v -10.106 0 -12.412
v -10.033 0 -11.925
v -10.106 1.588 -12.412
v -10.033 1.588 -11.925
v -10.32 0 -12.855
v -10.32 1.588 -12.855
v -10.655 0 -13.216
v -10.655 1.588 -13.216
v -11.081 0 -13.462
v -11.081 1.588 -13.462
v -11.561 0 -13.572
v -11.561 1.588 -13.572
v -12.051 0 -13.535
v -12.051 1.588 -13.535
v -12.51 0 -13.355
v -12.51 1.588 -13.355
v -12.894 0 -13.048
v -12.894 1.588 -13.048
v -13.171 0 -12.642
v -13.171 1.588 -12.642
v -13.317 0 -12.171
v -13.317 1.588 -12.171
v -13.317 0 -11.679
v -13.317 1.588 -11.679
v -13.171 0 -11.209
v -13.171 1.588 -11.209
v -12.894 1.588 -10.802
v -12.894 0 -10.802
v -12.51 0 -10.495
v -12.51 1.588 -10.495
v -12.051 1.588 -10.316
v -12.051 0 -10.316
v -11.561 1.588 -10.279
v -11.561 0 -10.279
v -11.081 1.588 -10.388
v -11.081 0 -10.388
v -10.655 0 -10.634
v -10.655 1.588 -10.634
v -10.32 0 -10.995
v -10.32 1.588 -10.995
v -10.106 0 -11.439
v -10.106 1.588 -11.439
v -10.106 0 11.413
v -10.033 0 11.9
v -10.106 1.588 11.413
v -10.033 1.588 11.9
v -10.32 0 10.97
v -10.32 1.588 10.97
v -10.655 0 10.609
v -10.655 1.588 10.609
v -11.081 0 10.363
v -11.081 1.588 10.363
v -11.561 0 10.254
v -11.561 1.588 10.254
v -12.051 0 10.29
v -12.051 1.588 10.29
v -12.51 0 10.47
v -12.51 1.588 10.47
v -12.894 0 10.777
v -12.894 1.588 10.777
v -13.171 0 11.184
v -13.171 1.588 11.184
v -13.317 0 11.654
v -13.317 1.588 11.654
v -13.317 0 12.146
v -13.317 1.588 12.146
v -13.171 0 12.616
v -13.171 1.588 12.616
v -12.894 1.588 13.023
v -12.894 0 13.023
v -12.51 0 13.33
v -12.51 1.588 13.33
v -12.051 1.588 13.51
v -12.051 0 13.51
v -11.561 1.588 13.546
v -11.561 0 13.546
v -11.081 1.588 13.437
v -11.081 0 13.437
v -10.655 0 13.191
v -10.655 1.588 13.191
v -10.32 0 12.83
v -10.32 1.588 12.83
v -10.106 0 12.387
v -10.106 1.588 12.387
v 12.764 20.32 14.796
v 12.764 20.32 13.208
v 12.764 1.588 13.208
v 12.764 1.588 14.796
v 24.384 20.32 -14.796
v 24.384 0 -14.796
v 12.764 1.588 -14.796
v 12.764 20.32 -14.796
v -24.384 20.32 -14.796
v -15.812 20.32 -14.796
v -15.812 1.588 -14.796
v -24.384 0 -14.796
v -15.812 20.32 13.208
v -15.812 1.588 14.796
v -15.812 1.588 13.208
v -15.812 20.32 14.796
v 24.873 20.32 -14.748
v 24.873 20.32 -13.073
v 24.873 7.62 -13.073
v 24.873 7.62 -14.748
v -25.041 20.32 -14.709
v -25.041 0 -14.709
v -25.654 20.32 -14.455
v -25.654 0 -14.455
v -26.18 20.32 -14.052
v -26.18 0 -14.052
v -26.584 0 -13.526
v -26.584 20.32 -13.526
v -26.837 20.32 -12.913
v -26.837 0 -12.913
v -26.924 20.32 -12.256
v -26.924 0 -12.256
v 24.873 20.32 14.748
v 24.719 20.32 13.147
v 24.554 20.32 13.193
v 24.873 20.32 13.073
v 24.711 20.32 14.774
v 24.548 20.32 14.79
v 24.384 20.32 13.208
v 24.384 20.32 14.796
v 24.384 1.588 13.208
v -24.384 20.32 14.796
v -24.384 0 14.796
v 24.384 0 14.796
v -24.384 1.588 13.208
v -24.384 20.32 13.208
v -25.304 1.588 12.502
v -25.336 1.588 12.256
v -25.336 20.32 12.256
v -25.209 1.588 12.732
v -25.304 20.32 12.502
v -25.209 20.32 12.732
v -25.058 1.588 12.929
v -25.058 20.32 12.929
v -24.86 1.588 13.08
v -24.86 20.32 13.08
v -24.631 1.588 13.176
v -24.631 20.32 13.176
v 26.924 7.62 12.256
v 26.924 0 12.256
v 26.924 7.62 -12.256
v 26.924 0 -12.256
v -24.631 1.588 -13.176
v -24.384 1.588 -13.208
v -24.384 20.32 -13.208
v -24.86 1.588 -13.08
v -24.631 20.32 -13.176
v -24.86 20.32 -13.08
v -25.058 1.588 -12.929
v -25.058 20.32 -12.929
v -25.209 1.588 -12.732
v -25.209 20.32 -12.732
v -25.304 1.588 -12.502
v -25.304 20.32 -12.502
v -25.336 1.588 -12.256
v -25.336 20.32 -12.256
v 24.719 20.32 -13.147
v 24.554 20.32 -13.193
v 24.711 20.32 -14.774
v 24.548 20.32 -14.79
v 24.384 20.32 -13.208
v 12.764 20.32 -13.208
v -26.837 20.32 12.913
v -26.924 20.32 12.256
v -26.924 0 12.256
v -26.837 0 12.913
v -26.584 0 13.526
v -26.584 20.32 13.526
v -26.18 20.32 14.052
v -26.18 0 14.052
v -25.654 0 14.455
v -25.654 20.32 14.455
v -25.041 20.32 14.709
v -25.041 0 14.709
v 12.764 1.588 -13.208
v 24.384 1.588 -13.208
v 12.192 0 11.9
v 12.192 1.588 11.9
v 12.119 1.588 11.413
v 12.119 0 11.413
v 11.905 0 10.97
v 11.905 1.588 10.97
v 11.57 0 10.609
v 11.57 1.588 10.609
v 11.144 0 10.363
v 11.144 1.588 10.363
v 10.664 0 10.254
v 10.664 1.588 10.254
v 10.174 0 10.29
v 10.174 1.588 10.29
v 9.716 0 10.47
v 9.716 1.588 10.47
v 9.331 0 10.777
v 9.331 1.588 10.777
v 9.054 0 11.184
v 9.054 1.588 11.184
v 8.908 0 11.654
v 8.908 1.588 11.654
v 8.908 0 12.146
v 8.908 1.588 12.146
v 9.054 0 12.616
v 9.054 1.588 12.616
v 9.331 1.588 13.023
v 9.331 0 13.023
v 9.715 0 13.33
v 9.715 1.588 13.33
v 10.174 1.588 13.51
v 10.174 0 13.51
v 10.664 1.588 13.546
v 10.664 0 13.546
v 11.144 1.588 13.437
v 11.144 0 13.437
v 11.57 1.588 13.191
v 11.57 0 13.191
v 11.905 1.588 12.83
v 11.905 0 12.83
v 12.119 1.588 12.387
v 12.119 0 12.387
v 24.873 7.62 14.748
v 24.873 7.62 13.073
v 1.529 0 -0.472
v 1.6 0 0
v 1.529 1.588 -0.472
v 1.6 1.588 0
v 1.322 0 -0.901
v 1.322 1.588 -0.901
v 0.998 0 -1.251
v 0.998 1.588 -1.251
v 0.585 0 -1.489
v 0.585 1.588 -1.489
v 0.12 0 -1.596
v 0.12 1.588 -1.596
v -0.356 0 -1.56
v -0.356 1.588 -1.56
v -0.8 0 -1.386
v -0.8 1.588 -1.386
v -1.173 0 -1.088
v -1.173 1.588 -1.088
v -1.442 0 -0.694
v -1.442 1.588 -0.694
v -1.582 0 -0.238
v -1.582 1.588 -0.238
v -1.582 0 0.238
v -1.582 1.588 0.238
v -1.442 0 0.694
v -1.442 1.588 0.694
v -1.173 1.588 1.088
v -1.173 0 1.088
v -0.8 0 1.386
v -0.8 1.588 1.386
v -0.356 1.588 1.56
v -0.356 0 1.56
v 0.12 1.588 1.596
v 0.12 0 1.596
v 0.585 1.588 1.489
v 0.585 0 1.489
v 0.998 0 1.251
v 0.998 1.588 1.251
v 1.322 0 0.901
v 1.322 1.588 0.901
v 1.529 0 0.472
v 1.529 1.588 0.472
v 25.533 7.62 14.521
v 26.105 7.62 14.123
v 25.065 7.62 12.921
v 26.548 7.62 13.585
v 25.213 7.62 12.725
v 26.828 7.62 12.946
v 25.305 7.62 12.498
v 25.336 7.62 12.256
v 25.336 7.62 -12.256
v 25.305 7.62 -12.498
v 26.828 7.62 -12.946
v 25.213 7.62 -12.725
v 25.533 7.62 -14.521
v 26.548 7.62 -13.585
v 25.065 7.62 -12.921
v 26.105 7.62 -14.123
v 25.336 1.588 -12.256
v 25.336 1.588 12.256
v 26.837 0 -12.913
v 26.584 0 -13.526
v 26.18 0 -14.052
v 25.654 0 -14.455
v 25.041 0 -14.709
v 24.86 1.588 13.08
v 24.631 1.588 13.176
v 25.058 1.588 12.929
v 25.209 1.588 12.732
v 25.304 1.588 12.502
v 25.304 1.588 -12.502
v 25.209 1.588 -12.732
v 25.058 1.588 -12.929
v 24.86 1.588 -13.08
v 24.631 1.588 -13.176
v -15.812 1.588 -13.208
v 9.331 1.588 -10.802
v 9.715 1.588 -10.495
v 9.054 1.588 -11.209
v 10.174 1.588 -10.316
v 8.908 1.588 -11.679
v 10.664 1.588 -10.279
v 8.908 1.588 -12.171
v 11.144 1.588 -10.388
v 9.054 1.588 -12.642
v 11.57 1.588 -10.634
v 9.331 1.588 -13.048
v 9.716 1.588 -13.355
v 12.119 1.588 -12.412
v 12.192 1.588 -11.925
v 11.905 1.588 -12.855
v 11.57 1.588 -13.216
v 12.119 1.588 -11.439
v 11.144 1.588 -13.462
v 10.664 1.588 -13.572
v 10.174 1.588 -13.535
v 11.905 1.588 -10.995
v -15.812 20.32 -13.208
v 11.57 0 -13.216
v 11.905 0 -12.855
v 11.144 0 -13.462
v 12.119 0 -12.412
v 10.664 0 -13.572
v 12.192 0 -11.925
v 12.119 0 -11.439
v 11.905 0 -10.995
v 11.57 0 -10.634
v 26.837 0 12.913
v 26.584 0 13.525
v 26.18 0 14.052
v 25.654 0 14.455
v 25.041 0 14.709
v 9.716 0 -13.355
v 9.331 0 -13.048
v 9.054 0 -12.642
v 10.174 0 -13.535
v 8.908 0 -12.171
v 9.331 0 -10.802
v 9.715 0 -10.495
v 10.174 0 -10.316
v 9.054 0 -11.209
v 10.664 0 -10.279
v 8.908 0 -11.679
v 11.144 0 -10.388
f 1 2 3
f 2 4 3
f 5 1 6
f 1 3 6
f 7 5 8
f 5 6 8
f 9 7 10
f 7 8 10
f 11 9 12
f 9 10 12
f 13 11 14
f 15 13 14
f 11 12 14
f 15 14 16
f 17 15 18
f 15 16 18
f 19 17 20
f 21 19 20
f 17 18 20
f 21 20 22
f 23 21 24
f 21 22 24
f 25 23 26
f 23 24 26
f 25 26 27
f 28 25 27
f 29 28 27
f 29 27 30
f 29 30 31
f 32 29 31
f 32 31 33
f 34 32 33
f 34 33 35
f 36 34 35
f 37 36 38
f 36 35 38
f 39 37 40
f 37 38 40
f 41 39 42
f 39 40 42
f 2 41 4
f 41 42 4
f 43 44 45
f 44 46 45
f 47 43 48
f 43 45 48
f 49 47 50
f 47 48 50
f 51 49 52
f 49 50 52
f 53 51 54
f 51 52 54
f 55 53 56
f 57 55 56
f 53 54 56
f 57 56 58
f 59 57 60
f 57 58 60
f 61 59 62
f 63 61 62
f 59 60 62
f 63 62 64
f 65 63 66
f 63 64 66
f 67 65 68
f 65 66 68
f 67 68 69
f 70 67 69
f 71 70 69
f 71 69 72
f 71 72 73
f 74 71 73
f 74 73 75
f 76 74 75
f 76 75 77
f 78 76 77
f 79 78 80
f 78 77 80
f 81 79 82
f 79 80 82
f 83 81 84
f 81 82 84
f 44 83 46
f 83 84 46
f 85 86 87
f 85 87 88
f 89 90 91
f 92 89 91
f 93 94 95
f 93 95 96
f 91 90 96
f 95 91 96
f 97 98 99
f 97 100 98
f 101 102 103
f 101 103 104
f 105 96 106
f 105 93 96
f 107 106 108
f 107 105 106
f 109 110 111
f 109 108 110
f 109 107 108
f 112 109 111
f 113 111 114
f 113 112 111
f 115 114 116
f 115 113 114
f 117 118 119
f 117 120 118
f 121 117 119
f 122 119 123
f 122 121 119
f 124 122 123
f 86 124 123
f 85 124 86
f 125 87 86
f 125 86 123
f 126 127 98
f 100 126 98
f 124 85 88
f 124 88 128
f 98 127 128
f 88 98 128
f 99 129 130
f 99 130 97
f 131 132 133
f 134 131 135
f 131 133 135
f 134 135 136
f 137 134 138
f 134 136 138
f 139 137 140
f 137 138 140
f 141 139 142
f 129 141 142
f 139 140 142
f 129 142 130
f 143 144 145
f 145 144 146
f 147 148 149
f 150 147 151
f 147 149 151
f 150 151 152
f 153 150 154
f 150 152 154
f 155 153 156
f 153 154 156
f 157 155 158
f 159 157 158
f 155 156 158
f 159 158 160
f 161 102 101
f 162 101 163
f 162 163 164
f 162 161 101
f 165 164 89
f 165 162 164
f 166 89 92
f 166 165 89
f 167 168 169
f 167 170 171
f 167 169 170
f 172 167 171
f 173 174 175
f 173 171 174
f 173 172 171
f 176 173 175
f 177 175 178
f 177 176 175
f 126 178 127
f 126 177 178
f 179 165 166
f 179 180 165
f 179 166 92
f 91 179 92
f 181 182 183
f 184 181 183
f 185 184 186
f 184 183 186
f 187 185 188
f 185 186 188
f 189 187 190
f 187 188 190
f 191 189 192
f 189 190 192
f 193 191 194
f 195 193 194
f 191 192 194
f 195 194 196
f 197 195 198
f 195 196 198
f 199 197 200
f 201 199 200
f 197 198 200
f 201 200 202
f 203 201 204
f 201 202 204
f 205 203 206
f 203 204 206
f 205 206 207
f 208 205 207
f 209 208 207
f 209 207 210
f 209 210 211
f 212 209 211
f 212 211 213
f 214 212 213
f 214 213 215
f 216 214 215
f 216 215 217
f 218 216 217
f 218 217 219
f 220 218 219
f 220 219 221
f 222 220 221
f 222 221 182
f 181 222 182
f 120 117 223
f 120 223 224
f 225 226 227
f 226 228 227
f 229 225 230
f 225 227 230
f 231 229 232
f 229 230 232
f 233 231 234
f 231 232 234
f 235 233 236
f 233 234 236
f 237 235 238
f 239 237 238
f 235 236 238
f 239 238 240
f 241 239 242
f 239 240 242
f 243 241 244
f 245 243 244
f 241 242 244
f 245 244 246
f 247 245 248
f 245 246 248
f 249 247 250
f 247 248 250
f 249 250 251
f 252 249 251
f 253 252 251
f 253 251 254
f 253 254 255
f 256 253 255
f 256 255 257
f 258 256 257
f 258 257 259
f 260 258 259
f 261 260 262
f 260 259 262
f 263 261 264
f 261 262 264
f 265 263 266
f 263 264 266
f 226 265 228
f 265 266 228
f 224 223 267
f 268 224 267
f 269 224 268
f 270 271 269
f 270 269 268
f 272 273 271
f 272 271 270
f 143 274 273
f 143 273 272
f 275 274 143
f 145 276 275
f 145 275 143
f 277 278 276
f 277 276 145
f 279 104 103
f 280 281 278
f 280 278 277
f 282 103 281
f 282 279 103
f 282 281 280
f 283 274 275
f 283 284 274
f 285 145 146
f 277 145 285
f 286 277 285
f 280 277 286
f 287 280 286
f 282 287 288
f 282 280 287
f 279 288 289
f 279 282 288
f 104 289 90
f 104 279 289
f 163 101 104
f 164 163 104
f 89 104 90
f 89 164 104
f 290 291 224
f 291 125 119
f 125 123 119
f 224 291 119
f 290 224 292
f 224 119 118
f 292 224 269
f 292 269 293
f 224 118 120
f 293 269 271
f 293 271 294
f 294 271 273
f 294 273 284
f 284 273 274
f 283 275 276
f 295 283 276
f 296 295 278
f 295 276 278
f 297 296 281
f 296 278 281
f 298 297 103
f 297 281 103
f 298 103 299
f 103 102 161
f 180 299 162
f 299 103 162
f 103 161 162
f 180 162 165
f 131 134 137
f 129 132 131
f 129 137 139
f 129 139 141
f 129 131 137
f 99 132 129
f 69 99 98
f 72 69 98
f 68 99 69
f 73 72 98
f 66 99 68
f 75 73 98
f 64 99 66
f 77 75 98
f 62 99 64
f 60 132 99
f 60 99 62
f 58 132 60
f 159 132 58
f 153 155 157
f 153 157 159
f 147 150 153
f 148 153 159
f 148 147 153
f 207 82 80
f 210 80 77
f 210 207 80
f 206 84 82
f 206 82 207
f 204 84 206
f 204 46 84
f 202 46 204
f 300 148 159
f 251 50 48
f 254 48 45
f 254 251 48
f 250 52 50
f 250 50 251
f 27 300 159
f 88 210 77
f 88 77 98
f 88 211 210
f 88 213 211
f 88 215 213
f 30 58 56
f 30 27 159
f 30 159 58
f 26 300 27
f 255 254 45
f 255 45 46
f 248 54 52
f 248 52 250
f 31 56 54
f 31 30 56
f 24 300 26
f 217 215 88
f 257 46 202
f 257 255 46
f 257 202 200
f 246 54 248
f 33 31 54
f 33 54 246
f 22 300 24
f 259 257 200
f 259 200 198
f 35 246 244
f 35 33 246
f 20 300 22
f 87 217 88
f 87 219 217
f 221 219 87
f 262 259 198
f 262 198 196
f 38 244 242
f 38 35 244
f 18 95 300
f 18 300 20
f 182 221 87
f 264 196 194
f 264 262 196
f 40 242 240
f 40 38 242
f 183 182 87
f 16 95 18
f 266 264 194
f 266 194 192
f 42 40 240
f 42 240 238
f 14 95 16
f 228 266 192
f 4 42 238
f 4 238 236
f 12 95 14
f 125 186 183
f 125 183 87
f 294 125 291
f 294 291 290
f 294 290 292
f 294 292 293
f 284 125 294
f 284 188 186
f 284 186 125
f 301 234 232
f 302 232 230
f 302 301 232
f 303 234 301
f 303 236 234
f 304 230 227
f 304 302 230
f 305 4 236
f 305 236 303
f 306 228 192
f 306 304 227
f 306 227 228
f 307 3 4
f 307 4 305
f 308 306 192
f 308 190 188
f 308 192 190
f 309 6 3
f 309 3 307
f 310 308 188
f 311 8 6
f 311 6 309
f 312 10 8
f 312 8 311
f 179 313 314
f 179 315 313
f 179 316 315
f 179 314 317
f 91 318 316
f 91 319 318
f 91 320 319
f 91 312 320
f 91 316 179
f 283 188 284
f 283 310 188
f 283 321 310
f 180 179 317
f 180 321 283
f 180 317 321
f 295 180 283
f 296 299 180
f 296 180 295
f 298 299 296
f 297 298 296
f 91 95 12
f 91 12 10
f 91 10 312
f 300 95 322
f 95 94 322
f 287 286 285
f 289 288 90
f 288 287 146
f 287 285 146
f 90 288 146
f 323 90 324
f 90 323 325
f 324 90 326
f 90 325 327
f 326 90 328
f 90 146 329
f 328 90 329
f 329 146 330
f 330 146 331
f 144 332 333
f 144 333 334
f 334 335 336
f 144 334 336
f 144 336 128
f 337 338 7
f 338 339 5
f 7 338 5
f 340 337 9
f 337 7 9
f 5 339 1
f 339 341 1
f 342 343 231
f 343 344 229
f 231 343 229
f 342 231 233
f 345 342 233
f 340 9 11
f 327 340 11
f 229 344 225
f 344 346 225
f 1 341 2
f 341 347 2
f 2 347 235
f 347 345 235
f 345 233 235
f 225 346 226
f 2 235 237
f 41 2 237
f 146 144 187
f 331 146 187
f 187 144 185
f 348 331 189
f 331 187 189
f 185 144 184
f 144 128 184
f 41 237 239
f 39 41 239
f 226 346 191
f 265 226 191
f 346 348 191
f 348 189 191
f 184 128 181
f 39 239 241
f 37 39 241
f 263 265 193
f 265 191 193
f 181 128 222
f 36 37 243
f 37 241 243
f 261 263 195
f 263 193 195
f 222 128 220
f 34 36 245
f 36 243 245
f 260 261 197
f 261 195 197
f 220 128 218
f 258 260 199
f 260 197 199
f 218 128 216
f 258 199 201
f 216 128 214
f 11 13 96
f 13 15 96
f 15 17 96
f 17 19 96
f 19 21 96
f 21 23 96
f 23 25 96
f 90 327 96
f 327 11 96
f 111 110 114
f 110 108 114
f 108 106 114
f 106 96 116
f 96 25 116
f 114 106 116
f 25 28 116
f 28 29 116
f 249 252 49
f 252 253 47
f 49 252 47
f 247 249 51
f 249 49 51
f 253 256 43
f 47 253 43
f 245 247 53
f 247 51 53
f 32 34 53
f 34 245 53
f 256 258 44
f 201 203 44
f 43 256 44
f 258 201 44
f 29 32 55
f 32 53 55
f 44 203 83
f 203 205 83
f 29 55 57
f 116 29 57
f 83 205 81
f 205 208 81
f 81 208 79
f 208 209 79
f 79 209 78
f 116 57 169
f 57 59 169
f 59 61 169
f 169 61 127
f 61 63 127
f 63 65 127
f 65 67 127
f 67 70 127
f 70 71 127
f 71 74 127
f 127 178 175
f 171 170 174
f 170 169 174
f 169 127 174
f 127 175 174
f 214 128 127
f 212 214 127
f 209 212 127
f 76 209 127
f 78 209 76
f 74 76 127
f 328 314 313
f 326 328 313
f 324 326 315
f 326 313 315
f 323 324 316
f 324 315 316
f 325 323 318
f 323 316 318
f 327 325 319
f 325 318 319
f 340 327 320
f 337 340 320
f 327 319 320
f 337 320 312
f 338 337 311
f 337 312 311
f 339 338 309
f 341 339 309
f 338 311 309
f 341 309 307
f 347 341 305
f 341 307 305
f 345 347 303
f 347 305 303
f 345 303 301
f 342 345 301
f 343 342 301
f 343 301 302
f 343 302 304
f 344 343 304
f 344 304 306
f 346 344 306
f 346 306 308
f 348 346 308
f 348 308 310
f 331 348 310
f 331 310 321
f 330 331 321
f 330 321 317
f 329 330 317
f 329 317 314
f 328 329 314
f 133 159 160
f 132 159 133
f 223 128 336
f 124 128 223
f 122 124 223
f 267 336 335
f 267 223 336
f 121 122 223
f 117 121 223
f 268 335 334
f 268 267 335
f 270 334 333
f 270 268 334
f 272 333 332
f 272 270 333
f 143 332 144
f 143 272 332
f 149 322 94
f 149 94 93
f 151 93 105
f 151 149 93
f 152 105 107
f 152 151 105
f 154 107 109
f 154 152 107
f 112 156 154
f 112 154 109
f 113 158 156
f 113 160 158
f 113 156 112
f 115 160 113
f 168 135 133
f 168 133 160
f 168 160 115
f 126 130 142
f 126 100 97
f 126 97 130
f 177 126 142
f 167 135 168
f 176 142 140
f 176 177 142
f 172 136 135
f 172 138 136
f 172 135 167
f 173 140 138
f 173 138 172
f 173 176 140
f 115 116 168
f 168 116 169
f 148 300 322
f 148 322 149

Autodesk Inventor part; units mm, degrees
ref_plane "YZ Plane" through (0, 0, 0) normal (1, 0, 0) x (0, 1, 0)
ref_plane "XZ Plane" through (0, 0, 0) normal (0, 1, 0) x (-1, 0, 0)
ref_plane "XY Plane" through (0, 0, 0) normal (0, 0, 1) x (1, 0, 0)
sketch "Esquisse1" plane through (0, 0, 0) normal (0, 1, 0) x (-1, 0, 0)
  line L0 (-26.924, -14.7955) -> (26.924, -14.7955)
  line L1 (26.924, -14.7955) -> (26.924, 14.7955)
  line L2 (26.924, 14.7955) -> (-26.924, 14.7955)
  line L3 (-26.924, 14.7955) -> (-26.924, -14.7955)
  point P0 (0, 0)
  dimension "d0" = 29.591
  dimension "d1" = 53.848
  dimension "d2" = 26.924
  dimension "d3" = 14.7955
extrude "Extrusion1" add sketch "Esquisse1" along normal blind 20.32
fillet "Congé1" radius 2.54 4 edges at (-26.924, 10.16, 14.7955) (26.924, 10.16, 14.7955) (26.924, 10.16, -14.7955) (-26.924, 10.16, -14.7955)
shell "Coque1" thickness 1.5875 removed faces 1 at (-8.128, 20.32, -4.9318)
sketch "Esquisse3" plane through (0, 20.32, 0) normal (0, 1, 0) x (1, 0, 0)
  line L0 (-26.924, 12.2555) -> (-26.924, -12.2555) projected
  line L1 (-24.384, -14.7955) -> (24.384, -14.7955) projected
  line L2 (-15.8115, 11.1125) -> (12.7635, 11.1125)
  line L3 (12.7635, 11.1125) -> (12.7635, 17.4625)
  line L4 (12.7635, 17.4625) -> (-15.8115, 17.4625)
  line L5 (-15.8115, 17.4625) -> (-15.8115, 11.1125)
  line L6 (-15.8115, -11.1125) -> (12.7635, -11.1125)
  line L7 (12.7635, -11.1125) -> (12.7635, -17.4625)
  line L8 (12.7635, -17.4625) -> (-15.8115, -17.4625)
  line L9 (-15.8115, -17.4625) -> (-15.8115, -11.1125)
  point P0 (0, 0)
  dimension "d8" = 28.575
  dimension "d9" = 28.575
  dimension "d10" = 11.1125
  dimension "d11" = 11.1125
  dimension "d12" = 6.35
  dimension "d13" = 6.35
  dimension "d14" = 22.225
  dimension "d15" = 2.667
extrude "Extrusion2" cut sketch "Esquisse3" against normal blind 18.7325
sketch "Esquisse4" plane through (0, 20.32, 0) normal (0, 1, 0) x (1, 0, 0)
  line L0 (24.8732, 15.6385) -> (27.4132, 15.6385)
  line L1 (27.4132, 15.6385) -> (27.4132, -16.1115)
  line L2 (27.4132, -16.1115) -> (24.8732, -16.1115)
  line L3 (24.8732, -16.1115) -> (24.8732, 15.6385)
  point P0 (0, 0)
  dimension "d18" = 31.75
  dimension "d19" = 2.54
extrude "Extrusion3" cut sketch "Esquisse4" against normal blind 12.7
sketch "Esquisse5" plane through (25.3365, 1.5875, 12.2555) normal (0, 1, 0) x (1, 0, 0)
  line L0 (-50.673, 24.511) -> (-50.673, 0) projected
  line L1 (-12.573, -2.54) -> (-41.148, -2.54) projected
  circle A0 centre (-37.0205, 24.1808) radius 1.651
  circle A1 centre (-14.7955, 24.1808) radius 1.651
  circle A2 centre (-14.7955, 0.3556) radius 1.651
  circle A3 centre (-37.0205, 0.3556) radius 1.651
  circle A4 centre (-25.3365, 12.2555) radius 1.6
  line L2 (-49.7205, -2.54) -> (-41.148, -2.54) projected
  dimension "d22" = 3.302
  dimension "d23" = 3.302
  dimension "d24" = 3.302
  dimension "d25" = 3.302
  dimension "d26" = 3.2
  dimension "d27" = 23.8252
  dimension "d28" = 23.8252
  dimension "d29" = 22.225
  dimension "d30" = 22.225
  dimension "d31" = 2.8956
  dimension "d32" = 13.6525
  dimension "d33" = 2.8956
  dimension "d34" = 13.6525
extrude "Extrusion4" cut sketch "Esquisse5" against normal through all
equation "\"d2\" = 0.5 * d1"
equation "\"d3\" = 0.5 * d0"
equation "\"d9\" = d8"
equation "\"d11\" = d10"
equation "\"d23\" = d22"
equation "\"d24\" = d22"
equation "\"d25\" = d22"
equation "\"d28\" = d27"
equation "\"d30\" = d29"
equation "\"d33\" = d31"
equation "\"d34\" = d32"
properties part number "Batterie" material "Plastique ABS"
